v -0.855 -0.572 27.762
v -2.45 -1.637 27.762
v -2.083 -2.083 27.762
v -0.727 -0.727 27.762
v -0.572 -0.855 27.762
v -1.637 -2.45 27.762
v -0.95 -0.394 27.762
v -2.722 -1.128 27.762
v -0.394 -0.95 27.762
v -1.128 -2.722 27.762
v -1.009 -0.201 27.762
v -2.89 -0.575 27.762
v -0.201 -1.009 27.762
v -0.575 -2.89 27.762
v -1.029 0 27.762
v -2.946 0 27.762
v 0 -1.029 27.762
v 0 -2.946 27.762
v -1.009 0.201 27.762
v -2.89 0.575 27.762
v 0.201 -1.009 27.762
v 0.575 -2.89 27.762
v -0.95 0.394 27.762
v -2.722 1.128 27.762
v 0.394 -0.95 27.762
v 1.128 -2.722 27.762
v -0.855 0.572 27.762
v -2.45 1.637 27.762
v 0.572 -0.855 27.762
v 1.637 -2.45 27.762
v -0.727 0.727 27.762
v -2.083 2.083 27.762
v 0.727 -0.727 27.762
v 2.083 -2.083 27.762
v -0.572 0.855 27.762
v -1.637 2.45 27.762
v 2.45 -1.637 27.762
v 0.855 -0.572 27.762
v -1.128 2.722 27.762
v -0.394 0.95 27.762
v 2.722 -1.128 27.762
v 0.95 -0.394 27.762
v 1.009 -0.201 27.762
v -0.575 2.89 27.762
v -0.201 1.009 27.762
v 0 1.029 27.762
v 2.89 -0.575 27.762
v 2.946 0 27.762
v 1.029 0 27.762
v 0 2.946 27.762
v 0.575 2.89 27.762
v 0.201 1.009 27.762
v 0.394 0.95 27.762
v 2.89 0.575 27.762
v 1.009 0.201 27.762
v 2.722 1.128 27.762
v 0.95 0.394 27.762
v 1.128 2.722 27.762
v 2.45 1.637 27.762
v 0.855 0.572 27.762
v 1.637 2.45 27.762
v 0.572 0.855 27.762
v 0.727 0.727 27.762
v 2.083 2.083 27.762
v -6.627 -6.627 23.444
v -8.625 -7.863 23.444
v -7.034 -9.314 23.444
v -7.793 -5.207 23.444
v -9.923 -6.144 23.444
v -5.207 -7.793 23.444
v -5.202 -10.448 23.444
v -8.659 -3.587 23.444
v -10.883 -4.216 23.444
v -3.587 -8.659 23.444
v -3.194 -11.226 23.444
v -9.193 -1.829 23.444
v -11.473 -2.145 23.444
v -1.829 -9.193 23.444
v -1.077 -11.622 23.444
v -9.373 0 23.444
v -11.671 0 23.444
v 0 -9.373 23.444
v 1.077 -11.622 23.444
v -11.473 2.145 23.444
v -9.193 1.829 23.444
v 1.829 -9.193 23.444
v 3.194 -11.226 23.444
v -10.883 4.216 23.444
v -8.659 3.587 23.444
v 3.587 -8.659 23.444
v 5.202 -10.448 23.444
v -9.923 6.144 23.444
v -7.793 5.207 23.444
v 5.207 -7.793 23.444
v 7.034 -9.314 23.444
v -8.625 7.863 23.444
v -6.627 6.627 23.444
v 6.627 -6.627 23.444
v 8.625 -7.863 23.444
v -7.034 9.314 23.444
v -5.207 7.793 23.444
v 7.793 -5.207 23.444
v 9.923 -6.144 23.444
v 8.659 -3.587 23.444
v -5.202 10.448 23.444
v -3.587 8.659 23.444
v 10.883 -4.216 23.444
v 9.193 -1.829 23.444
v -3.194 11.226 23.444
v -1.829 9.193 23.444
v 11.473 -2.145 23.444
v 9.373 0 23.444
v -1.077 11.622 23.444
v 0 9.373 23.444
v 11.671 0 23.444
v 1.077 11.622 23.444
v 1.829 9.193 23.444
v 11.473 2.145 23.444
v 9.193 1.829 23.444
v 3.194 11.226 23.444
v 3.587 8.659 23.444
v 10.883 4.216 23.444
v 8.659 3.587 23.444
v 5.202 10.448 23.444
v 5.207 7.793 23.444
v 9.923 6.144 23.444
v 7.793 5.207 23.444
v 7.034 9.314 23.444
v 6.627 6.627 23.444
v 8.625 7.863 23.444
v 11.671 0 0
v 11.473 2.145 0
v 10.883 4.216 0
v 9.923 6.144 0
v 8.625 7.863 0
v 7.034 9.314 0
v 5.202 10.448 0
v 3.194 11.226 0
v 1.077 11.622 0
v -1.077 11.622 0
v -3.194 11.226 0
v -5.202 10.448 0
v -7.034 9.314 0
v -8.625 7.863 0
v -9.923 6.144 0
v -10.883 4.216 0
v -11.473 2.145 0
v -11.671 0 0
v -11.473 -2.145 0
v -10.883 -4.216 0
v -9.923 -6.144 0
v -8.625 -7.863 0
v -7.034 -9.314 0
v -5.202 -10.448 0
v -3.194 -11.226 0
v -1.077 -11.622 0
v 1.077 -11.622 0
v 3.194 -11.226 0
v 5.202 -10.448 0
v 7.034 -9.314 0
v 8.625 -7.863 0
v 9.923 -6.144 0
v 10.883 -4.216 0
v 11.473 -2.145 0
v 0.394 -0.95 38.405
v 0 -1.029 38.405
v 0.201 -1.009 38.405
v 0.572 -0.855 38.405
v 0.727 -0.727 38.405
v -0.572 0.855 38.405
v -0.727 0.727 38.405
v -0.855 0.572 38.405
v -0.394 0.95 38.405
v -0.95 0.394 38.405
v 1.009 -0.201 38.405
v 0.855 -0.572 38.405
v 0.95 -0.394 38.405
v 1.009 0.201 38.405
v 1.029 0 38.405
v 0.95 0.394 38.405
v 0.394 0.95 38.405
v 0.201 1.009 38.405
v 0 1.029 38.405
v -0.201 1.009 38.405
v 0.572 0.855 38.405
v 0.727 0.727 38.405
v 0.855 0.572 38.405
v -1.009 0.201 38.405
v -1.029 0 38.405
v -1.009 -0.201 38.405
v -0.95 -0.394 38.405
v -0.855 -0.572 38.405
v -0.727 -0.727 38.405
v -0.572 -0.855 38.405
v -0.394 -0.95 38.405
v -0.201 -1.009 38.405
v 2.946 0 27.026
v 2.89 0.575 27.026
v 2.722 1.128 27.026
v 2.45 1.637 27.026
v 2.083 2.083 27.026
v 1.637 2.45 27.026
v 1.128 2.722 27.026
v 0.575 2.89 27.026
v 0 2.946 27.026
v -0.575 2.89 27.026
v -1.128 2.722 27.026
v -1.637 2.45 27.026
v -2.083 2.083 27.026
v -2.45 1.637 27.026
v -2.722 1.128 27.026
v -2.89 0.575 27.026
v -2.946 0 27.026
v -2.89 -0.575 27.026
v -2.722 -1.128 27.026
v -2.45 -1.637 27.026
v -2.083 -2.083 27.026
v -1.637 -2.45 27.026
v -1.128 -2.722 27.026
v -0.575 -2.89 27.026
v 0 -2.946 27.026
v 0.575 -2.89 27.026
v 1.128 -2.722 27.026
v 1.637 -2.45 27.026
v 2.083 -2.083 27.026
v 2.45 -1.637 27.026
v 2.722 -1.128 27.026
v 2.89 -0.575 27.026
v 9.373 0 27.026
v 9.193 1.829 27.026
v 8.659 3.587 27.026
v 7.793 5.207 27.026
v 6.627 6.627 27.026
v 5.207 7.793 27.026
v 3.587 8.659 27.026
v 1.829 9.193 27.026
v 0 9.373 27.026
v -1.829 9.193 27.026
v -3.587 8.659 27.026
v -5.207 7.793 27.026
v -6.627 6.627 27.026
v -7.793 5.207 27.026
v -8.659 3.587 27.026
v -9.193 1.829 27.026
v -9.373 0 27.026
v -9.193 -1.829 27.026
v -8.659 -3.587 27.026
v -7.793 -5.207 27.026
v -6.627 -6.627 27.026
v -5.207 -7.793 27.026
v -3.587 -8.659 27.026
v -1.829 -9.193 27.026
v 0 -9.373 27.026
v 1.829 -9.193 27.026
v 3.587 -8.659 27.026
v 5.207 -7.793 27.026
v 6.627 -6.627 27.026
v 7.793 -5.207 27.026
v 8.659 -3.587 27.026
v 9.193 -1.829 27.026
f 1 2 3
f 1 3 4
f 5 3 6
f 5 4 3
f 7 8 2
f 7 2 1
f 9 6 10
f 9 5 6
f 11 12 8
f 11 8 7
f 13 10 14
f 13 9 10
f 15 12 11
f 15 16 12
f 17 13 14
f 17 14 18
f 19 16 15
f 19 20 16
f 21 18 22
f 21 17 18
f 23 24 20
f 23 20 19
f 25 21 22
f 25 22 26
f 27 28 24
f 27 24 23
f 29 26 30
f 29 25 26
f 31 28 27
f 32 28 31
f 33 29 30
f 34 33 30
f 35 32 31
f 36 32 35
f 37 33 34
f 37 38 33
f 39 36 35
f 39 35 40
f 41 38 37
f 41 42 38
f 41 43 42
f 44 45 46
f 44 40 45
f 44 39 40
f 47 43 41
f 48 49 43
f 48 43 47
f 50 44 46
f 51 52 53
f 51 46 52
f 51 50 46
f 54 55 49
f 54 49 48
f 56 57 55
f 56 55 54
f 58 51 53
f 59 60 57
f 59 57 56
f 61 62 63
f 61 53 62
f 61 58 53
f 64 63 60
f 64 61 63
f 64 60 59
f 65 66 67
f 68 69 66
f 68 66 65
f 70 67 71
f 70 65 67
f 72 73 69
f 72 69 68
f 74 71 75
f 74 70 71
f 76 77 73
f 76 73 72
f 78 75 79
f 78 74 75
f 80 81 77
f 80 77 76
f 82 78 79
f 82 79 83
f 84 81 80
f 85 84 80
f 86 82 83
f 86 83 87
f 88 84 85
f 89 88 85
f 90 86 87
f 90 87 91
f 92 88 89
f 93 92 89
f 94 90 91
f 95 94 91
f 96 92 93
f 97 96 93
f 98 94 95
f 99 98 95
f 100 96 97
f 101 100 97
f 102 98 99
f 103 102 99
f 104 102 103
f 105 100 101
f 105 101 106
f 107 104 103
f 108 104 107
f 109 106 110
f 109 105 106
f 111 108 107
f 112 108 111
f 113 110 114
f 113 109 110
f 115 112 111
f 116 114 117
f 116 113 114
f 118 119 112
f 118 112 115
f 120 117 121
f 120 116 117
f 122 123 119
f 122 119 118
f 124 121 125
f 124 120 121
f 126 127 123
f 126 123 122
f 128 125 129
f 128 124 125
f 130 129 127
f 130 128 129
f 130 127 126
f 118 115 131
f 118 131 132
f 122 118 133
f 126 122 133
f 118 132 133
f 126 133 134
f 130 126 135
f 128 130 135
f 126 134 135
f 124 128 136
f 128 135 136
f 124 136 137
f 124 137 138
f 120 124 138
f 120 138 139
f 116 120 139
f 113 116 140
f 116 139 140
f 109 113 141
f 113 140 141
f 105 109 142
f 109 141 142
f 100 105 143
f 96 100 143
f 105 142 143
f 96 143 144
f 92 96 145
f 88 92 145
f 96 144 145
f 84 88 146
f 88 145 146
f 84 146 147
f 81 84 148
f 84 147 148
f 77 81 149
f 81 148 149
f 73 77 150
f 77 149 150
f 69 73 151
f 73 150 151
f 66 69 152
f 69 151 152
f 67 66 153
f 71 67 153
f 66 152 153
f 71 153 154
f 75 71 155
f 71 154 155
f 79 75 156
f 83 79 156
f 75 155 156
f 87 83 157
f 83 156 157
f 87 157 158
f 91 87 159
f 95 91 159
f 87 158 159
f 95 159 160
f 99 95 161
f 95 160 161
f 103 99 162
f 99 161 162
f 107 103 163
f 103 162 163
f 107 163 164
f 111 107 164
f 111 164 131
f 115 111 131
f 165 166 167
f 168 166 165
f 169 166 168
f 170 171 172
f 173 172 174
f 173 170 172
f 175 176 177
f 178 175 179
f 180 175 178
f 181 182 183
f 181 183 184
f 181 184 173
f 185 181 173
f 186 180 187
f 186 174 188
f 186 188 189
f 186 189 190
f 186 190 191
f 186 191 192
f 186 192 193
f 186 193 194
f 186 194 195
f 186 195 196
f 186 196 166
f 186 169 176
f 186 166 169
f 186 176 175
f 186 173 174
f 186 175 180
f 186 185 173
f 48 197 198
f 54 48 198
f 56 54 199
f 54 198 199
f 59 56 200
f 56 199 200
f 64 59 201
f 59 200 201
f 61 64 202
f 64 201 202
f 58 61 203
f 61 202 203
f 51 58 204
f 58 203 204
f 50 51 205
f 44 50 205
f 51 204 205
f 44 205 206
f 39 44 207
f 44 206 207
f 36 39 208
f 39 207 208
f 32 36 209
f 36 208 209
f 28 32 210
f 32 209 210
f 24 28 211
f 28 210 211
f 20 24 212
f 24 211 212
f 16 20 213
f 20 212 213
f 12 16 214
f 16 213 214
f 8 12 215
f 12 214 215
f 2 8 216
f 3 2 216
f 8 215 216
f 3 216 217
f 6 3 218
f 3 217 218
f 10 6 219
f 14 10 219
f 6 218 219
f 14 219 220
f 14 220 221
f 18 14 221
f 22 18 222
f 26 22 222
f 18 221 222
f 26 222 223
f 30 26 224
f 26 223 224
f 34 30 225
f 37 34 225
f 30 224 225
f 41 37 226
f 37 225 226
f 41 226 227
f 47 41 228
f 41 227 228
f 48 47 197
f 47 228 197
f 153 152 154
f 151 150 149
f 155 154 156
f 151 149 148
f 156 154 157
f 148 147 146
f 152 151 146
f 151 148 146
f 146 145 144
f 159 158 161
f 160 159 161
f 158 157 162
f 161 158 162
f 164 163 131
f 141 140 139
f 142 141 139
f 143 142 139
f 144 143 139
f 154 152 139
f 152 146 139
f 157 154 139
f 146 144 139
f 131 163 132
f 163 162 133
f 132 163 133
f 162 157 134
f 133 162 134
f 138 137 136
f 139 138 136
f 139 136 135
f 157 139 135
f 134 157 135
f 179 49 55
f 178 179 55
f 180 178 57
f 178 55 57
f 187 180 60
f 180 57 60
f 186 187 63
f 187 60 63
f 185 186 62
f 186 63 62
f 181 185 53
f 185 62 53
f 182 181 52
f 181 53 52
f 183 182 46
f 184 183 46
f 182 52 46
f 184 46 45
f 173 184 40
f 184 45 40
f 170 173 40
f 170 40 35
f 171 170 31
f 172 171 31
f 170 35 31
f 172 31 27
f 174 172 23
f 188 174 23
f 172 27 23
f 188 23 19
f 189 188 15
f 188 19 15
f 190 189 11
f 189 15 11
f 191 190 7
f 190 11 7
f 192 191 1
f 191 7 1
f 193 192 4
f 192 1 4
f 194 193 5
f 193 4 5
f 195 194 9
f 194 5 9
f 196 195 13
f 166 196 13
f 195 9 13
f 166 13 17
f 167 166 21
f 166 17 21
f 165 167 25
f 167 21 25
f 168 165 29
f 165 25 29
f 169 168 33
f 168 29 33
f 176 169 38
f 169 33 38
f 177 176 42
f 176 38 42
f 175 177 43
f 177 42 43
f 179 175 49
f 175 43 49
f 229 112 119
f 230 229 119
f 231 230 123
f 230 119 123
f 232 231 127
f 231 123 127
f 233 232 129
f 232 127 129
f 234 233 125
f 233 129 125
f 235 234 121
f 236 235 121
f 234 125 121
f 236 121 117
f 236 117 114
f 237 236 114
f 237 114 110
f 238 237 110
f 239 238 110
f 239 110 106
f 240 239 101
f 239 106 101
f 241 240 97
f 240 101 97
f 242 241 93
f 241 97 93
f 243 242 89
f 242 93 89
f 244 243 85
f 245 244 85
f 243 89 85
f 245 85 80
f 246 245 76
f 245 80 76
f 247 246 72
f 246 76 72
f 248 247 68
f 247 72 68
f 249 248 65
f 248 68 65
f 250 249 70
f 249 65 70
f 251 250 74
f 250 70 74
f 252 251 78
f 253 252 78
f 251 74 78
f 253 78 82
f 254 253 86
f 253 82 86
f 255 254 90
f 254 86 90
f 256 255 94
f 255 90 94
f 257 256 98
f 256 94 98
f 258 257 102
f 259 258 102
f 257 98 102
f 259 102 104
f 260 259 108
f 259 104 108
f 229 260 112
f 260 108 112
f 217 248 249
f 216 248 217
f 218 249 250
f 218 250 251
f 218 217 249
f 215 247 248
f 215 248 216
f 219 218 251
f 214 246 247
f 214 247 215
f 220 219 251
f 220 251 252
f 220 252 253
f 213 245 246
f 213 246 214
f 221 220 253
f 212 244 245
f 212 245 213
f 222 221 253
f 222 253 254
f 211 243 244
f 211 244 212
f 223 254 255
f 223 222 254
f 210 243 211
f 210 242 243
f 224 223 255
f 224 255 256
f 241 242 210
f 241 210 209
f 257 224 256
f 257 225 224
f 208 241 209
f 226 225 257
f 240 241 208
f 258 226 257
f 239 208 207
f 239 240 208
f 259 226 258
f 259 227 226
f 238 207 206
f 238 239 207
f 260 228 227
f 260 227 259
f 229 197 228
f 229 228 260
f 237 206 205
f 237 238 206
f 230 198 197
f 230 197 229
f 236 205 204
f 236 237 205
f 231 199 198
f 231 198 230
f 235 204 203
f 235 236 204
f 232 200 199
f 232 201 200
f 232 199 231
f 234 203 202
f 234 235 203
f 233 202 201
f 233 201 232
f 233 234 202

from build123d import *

# Parameters (mm, degrees)
SKETCH1_R           = 11.6713
BOSS_EXTRUDE1_DEPTH = 23.4442
SKETCH4_R           = 9.3726
BOSS_EXTRUDE3_DEPTH = 3.5814
SKETCH5_R           = 2.9464
BOSS_EXTRUDE4_DEPTH = 0.7366
SKETCH2_R           = 1.0287
BOSS_EXTRUDE2_DEPTH = 10.6426


with BuildPart() as part:
    # Sketch1 → Boss-Extrude1 (new body)
    with BuildSketch(Plane.XY):
        Circle(SKETCH1_R)
    extrude(amount=BOSS_EXTRUDE1_DEPTH)

    # Sketch4 → Boss-Extrude3 (add)
    with BuildSketch(Plane.XY.offset(23.4442)):
        Circle(SKETCH4_R)
    extrude(amount=BOSS_EXTRUDE3_DEPTH)

    # Sketch5 → Boss-Extrude4 (add)
    with BuildSketch(Plane.XY.offset(27.0256)):
        Circle(SKETCH5_R)
    extrude(amount=BOSS_EXTRUDE4_DEPTH)

    # Sketch2 → Boss-Extrude2 (add)
    with BuildSketch(Plane.XY.offset(27.7622)):
        Circle(SKETCH2_R)
    extrude(amount=BOSS_EXTRUDE2_DEPTH)


solid = part.part
